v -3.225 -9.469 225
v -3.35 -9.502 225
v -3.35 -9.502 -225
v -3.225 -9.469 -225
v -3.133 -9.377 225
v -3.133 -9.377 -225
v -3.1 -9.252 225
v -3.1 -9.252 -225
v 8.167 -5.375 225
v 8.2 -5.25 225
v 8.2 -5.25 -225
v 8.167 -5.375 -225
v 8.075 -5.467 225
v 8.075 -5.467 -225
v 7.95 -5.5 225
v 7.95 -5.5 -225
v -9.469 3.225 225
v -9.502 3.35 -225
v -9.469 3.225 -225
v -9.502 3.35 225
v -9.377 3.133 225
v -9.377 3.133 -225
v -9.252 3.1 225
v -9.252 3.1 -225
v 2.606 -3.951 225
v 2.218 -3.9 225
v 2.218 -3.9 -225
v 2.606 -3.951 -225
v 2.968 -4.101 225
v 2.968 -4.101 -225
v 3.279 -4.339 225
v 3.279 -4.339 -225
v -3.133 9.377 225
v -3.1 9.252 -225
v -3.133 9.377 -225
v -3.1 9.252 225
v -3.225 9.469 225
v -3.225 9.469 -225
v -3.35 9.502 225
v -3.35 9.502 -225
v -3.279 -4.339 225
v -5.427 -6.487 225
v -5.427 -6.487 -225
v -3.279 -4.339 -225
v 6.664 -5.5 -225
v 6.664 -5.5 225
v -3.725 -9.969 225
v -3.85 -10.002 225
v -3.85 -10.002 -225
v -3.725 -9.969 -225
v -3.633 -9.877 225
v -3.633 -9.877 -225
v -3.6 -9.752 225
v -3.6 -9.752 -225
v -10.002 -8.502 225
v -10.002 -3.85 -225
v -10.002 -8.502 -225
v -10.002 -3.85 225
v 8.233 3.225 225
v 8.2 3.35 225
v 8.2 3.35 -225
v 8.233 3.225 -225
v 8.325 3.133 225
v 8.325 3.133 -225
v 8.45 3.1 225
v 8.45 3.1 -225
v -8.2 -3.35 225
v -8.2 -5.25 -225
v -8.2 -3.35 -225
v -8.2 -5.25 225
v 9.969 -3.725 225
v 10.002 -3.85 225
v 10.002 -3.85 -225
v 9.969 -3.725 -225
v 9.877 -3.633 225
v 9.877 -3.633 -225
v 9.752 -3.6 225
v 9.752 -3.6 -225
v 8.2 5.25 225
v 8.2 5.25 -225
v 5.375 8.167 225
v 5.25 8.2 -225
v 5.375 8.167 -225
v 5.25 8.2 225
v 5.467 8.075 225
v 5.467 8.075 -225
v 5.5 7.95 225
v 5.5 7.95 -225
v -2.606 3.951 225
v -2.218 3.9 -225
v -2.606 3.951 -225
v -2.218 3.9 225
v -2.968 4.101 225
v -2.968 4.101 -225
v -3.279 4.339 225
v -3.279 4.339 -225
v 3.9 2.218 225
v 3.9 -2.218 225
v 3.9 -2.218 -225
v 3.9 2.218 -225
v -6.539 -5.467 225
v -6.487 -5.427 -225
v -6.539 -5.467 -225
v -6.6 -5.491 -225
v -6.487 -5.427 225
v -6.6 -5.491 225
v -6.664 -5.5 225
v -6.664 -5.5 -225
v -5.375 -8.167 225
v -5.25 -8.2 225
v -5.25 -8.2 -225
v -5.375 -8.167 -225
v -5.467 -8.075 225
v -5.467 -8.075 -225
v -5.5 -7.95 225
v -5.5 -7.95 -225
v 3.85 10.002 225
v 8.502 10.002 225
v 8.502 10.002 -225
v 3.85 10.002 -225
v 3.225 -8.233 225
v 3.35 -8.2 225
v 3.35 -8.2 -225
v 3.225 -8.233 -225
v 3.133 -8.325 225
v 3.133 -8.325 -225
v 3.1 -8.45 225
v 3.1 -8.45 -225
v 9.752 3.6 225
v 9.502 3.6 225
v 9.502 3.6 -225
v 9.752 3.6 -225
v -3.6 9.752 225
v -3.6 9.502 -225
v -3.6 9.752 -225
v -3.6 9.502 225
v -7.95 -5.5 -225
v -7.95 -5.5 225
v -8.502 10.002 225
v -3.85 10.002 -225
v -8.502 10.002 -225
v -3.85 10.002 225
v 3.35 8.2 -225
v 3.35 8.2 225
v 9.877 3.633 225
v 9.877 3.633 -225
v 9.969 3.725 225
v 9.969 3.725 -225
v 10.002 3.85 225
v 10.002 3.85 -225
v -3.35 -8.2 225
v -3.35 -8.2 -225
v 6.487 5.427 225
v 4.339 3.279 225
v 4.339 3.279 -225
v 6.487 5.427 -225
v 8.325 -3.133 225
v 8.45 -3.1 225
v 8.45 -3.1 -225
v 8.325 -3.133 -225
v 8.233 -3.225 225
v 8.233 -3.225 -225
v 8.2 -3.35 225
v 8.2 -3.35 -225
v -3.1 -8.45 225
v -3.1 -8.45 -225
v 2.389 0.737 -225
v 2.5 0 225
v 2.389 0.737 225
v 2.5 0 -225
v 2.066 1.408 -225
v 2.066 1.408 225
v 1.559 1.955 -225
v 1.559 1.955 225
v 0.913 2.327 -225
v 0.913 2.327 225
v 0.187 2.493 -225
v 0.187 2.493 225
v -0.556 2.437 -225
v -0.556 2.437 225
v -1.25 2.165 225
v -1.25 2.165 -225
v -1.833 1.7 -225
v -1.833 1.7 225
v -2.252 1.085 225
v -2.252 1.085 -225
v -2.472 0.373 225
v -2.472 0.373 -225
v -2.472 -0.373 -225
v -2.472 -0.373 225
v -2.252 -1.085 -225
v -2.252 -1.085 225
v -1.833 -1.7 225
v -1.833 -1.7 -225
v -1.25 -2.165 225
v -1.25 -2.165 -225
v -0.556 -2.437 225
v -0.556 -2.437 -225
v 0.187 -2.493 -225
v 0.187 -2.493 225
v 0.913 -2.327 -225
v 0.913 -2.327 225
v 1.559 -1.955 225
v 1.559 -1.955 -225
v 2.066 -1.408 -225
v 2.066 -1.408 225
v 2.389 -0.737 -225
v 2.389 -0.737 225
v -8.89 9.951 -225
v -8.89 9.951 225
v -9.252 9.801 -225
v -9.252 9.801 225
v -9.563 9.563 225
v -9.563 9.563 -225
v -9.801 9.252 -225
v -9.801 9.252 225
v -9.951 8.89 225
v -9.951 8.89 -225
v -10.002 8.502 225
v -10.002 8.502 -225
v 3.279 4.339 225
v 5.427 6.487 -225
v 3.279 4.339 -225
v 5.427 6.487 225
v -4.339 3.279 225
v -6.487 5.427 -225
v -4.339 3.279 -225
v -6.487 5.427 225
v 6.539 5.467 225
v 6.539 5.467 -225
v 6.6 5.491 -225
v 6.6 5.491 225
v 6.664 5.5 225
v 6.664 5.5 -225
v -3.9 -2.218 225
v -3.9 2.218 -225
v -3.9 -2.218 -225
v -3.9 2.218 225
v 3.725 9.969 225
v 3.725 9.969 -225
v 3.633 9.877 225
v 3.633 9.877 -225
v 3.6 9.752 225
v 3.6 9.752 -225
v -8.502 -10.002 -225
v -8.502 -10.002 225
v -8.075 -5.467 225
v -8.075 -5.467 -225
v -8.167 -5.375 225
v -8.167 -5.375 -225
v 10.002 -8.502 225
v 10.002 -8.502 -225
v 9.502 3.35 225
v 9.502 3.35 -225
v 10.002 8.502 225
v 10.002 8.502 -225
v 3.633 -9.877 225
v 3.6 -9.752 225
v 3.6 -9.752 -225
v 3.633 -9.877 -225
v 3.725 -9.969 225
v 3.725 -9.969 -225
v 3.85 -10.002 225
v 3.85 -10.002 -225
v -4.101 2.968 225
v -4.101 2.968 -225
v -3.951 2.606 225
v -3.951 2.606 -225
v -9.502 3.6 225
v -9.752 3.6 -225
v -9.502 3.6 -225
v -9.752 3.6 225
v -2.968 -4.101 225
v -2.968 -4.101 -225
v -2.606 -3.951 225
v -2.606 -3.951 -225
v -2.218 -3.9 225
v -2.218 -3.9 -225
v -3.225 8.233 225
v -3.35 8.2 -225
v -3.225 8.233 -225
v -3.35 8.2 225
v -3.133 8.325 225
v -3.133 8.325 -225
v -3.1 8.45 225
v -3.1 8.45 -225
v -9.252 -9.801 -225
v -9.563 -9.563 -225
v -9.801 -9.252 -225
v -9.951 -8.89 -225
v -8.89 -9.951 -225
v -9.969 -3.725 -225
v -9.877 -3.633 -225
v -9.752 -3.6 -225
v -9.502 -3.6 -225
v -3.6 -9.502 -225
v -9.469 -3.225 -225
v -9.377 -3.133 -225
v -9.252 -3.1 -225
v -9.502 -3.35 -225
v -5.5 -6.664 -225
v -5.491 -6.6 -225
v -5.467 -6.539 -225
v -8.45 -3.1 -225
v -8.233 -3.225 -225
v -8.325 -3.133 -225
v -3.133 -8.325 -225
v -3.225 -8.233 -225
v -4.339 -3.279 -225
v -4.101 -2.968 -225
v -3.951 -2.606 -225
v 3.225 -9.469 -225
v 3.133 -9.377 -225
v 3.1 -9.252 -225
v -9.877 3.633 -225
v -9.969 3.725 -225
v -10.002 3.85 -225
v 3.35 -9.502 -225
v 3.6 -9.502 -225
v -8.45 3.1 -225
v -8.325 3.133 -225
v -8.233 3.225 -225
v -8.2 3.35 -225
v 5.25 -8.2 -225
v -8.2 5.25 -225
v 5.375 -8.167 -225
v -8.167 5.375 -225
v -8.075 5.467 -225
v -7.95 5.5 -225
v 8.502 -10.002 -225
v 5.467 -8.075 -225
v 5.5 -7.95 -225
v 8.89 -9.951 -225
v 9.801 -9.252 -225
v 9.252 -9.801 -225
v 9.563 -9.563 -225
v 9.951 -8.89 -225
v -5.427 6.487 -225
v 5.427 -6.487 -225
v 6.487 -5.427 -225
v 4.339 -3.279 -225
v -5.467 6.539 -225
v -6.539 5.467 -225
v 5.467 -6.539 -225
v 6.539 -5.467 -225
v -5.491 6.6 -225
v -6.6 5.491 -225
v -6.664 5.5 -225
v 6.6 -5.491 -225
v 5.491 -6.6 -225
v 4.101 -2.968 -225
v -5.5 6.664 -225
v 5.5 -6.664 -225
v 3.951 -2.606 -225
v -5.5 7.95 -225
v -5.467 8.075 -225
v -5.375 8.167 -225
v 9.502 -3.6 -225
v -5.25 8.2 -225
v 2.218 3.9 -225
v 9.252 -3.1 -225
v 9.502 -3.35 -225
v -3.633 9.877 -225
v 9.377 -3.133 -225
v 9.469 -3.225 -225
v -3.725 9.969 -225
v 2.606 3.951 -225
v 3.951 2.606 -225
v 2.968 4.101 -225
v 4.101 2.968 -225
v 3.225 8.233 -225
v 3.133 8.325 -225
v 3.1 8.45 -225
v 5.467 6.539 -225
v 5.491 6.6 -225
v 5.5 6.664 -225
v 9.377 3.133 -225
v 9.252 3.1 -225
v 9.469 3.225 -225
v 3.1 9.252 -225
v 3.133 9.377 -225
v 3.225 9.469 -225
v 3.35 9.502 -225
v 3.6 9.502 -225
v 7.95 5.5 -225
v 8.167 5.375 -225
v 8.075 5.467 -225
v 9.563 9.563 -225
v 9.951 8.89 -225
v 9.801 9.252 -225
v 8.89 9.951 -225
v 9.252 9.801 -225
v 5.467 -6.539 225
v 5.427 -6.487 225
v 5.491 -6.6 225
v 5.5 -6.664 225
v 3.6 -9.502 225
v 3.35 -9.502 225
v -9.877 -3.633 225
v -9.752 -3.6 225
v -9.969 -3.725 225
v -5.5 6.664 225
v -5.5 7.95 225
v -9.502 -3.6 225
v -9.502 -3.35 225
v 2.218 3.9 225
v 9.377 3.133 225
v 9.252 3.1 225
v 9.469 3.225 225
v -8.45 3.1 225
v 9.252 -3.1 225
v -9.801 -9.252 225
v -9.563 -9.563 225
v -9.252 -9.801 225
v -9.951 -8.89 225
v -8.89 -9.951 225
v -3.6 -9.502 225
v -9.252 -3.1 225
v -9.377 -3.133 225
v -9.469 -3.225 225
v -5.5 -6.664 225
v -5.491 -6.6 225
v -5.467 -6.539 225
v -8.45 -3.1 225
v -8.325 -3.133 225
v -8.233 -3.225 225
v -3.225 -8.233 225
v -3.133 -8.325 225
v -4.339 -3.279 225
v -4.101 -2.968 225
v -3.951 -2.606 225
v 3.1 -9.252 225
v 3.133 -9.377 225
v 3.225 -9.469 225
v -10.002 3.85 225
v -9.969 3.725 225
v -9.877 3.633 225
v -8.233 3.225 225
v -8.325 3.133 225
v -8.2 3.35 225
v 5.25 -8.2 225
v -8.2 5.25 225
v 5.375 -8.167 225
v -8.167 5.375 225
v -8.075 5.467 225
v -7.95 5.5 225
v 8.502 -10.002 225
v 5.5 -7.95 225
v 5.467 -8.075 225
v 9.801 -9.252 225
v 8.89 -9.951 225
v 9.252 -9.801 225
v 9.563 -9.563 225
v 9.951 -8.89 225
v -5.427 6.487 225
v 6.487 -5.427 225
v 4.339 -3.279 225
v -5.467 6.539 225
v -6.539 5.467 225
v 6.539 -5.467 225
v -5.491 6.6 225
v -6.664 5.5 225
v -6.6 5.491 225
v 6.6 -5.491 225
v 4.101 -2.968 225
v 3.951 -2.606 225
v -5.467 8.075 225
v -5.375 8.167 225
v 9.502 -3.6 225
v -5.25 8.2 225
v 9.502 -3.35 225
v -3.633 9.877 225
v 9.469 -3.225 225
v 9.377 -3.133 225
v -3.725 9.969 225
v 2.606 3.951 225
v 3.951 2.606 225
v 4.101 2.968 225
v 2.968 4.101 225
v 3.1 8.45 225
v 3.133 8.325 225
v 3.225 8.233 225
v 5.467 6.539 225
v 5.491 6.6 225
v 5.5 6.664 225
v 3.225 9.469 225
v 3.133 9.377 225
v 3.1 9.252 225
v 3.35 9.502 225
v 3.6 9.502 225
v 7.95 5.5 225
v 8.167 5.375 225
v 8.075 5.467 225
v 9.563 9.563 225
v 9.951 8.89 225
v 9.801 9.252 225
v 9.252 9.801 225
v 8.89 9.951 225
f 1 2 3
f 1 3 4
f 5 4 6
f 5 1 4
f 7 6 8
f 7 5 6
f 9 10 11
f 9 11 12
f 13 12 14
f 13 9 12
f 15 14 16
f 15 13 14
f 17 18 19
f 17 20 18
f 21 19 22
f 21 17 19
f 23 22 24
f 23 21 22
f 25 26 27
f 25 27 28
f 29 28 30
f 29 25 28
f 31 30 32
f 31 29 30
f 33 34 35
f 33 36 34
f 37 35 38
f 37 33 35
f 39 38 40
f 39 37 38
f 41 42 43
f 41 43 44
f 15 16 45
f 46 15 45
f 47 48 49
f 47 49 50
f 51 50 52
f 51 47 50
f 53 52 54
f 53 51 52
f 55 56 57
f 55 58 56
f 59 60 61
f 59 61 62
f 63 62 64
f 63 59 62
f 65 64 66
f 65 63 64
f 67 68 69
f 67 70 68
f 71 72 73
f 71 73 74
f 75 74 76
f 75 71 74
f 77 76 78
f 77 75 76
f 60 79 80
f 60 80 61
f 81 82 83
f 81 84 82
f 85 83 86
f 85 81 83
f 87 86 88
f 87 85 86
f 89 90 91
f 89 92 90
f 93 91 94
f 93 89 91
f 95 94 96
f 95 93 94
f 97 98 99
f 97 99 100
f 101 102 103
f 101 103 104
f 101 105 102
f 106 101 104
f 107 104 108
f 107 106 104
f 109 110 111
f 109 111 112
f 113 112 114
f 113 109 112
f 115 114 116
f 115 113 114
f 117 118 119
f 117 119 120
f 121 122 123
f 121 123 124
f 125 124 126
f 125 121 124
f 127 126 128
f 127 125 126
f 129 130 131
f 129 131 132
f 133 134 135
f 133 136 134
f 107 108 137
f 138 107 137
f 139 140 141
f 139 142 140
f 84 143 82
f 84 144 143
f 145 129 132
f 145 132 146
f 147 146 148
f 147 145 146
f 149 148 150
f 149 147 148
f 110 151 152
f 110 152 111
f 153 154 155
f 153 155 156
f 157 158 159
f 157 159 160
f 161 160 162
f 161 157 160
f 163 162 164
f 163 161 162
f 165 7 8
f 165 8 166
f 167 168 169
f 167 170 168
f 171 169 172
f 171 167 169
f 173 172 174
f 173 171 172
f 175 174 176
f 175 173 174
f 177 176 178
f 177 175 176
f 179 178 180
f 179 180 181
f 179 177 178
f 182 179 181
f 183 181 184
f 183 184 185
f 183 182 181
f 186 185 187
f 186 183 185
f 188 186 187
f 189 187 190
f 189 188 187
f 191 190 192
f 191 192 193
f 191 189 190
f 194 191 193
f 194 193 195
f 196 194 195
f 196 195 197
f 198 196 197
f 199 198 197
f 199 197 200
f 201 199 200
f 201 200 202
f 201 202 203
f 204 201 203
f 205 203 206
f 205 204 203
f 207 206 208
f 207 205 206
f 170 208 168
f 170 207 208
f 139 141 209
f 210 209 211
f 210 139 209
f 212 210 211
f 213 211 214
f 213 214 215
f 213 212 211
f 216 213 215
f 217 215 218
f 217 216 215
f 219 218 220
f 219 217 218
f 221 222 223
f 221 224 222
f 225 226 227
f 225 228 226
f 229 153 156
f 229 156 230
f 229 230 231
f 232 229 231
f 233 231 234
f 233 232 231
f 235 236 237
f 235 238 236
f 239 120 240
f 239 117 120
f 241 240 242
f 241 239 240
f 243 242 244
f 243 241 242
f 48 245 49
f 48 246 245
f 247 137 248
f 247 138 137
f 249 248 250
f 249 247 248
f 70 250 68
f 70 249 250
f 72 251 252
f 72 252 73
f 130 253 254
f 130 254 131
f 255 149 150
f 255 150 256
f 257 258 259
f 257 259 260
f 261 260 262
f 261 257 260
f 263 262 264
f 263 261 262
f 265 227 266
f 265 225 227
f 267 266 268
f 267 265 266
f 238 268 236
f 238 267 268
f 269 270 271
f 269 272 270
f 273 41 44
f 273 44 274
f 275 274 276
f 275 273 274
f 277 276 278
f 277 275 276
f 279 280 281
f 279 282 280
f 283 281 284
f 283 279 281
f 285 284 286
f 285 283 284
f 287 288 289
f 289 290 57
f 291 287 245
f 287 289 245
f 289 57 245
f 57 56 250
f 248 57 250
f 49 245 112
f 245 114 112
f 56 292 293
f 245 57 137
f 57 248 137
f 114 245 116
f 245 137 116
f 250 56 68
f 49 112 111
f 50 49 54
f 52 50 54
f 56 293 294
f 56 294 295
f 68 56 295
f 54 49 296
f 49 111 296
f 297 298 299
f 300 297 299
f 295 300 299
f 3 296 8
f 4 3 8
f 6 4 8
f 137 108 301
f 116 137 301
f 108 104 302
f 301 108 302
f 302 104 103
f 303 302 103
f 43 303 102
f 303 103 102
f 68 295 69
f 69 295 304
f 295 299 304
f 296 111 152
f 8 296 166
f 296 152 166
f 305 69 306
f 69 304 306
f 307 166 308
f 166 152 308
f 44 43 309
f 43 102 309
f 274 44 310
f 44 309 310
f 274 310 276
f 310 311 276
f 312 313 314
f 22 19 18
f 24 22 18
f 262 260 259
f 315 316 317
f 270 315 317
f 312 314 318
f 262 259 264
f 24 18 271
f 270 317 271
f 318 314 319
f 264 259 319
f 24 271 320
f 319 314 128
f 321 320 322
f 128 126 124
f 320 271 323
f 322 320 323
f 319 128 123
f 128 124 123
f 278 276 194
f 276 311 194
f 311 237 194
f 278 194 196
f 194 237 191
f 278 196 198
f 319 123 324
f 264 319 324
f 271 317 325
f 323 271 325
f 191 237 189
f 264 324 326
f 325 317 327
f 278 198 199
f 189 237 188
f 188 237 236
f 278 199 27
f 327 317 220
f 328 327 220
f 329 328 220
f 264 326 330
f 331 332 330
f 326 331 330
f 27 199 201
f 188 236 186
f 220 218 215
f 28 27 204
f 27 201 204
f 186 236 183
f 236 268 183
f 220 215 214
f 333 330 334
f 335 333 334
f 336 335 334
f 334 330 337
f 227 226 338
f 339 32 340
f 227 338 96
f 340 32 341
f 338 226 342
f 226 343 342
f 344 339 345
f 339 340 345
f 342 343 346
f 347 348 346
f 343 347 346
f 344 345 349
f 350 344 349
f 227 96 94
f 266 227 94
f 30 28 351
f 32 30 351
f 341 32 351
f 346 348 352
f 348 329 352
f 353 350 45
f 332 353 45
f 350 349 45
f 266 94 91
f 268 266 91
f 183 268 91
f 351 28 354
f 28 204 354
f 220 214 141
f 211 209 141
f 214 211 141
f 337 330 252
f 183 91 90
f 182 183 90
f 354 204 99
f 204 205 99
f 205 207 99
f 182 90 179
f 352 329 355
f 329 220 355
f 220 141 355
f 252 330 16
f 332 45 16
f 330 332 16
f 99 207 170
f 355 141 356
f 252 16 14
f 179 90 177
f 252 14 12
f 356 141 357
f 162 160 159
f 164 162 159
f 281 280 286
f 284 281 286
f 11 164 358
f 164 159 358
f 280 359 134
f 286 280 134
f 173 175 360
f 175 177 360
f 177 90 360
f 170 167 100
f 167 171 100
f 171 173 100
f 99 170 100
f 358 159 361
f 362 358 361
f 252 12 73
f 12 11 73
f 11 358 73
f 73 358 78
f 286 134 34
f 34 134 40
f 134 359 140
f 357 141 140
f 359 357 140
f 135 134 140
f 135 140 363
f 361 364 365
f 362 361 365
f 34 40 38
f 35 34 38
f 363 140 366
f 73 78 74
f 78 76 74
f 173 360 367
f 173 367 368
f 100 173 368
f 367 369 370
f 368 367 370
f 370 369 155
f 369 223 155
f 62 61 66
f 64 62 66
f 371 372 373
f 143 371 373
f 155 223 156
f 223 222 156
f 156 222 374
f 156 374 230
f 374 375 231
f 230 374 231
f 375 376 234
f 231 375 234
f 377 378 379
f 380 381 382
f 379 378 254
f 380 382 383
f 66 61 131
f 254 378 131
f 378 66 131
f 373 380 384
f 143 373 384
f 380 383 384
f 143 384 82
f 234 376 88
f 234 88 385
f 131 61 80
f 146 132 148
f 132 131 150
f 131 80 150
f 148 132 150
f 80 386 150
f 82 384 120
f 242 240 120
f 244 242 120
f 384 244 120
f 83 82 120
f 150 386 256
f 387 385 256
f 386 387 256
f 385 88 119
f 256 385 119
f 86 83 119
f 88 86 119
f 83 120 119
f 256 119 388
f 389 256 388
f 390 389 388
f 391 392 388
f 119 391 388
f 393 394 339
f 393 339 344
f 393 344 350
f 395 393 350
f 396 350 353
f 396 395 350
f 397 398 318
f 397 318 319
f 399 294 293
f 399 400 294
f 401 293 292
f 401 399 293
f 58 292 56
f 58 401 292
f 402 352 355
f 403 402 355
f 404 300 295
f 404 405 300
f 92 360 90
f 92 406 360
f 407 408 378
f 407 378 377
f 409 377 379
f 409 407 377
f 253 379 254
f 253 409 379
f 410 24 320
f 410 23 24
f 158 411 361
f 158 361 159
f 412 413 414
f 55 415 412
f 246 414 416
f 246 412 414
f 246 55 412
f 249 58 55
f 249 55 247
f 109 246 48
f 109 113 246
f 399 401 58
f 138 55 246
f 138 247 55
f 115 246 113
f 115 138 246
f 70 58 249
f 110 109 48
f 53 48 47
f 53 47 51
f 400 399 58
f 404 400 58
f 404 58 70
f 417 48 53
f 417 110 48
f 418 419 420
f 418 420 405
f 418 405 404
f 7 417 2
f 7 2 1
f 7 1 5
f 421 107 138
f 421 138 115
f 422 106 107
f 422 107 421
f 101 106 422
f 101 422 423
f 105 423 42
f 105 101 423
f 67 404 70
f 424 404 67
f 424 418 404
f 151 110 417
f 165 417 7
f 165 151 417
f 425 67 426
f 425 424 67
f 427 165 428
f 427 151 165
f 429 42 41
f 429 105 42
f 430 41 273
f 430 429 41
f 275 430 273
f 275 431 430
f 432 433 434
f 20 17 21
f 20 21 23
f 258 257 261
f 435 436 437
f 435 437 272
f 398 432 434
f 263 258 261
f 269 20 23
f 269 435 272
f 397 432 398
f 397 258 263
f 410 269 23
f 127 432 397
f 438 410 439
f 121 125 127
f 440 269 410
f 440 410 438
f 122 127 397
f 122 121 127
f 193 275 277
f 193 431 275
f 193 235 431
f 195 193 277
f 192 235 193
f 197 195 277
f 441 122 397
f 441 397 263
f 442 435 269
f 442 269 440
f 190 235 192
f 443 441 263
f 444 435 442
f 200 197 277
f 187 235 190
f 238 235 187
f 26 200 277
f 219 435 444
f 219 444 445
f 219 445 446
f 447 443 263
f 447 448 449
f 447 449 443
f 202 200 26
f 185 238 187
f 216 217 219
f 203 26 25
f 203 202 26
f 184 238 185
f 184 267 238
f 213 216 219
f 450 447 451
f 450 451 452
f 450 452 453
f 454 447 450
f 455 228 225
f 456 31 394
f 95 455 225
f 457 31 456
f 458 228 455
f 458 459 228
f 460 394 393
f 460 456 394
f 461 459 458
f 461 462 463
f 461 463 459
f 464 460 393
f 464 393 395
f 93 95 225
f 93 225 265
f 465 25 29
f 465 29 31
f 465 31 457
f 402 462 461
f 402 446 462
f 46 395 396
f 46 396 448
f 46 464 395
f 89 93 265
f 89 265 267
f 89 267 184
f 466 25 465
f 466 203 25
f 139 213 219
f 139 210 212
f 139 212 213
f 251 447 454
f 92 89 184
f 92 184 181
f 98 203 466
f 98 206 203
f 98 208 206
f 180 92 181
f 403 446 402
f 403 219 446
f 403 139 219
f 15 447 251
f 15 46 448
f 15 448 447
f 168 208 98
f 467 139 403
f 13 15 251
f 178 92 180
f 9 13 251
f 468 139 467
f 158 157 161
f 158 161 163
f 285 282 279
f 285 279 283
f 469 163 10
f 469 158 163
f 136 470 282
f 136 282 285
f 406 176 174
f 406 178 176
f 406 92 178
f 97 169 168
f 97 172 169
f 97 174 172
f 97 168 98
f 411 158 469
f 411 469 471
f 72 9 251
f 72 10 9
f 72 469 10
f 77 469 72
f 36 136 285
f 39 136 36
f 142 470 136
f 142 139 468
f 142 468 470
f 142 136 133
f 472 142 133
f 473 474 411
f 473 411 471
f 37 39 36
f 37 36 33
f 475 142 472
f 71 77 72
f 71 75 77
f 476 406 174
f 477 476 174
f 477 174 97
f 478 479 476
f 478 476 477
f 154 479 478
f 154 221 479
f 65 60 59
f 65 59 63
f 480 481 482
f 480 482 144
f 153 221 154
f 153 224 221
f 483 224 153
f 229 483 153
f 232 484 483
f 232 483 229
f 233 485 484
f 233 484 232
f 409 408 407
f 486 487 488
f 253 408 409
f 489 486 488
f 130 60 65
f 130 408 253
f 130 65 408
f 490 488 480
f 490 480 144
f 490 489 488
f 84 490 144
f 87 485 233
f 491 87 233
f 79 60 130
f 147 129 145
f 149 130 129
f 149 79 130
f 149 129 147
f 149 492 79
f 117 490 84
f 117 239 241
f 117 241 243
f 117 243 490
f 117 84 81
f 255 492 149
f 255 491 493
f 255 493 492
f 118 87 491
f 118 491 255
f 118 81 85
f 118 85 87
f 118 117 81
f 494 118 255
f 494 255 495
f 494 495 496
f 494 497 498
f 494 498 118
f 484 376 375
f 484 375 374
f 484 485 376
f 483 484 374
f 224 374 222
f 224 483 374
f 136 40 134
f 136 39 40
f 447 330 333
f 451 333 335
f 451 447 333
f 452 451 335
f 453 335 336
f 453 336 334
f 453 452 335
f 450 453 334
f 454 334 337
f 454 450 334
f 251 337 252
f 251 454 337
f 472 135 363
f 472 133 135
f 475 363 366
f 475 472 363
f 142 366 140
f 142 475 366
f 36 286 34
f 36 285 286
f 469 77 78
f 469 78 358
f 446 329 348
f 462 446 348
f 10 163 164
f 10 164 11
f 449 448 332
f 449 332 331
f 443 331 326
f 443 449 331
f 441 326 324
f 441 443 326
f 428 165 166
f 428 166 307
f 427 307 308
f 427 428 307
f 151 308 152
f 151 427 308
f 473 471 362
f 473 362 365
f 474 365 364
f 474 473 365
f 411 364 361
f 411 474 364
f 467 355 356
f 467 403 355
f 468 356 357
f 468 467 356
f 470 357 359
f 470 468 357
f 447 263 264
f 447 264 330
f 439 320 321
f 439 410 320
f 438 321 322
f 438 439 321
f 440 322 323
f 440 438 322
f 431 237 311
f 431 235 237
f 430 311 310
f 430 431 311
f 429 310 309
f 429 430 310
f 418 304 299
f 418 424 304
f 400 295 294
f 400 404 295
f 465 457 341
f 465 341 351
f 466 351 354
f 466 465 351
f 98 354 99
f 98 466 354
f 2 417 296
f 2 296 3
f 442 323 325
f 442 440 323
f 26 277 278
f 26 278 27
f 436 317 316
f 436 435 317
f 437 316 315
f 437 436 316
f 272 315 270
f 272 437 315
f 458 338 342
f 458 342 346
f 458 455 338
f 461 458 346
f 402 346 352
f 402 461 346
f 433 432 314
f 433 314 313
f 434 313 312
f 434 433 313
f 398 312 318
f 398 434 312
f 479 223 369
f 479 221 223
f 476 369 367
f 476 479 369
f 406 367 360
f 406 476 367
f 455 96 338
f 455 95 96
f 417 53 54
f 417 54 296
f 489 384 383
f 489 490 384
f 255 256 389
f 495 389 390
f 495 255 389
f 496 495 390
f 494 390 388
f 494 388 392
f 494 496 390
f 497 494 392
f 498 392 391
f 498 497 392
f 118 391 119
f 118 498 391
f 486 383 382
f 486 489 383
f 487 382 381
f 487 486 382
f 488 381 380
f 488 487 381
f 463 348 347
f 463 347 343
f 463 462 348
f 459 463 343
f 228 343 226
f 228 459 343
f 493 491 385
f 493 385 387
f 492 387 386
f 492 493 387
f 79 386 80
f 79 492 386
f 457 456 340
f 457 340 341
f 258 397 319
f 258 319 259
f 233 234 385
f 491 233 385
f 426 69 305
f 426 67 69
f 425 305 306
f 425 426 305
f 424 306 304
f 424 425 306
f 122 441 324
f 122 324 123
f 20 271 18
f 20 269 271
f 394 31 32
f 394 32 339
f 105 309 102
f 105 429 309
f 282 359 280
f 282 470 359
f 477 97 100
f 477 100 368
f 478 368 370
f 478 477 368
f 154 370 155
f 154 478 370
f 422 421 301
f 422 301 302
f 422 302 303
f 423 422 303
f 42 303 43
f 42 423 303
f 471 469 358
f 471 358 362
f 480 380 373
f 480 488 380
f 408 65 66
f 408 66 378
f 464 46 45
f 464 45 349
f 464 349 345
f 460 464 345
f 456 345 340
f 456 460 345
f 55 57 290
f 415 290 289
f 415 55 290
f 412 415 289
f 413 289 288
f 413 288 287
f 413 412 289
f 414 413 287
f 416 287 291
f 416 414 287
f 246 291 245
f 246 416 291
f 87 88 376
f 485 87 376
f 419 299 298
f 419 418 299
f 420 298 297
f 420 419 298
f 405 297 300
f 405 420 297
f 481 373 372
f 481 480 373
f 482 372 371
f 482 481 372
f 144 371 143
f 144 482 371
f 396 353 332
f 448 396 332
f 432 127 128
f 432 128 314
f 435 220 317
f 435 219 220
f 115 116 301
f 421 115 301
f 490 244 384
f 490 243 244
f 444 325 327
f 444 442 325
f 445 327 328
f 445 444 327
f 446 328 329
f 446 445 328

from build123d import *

# Parameters (mm, degrees)
SKETCH_1_R      = 2.5
EXTRUDE_1_DEPTH = 225


with BuildPart() as part:
    # 草图1 → 凸台-拉伸1 (new, symmetric)
    with BuildSketch(Plane.XY):
        with BuildLine():
            Line((-8.502261885, -10.002261885), (-3.85, -10.002261885))
            ThreePointArc((-3.85, -10.002261885), (-3.673223305, -9.929038581), (-3.6, -9.752261885))
            Line((-3.6, -9.752261885), (-3.6, -9.502261885))
            Line((-3.6, -9.502261885), (-3.35, -9.502261885))
            ThreePointArc((-3.35, -9.502261885), (-3.173223305, -9.429038581), (-3.1, -9.252261885))
            Line((-3.1, -9.252261885), (-3.1, -8.45))
            ThreePointArc((-3.1, -8.45), (-3.173223305, -8.273223305), (-3.35, -8.2))
            Line((-3.35, -8.2), (-5.25, -8.2))
            ThreePointArc((-5.25, -8.2), (-5.426776695, -8.126776695), (-5.5, -7.95))
            Line((-5.5, -7.95), (-5.5, -6.664213562))
            ThreePointArc((-5.5, -6.664213562), (-5.480969883, -6.568542704), (-5.426776695, -6.487436867))
            Line((-5.426776695, -6.487436867), (-3.278679656, -4.339339828))
            ThreePointArc((-3.278679656, -4.339339828), (-2.792044633, -4.014180701), (-2.218019485, -3.9))
            Line((-2.218019485, -3.9), (2.218019485, -3.9))
            ThreePointArc((2.218019485, -3.9), (2.792044633, -4.014180701), (3.278679656, -4.339339828))
            Line((3.278679656, -4.339339828), (5.426776695, -6.487436867))
            ThreePointArc((5.426776695, -6.487436867), (5.480969883, -6.568542704), (5.5, -6.664213562))
            Line((5.5, -6.664213562), (5.5, -7.95))
            ThreePointArc((5.5, -7.95), (5.426776695, -8.126776695), (5.25, -8.2))
            Line((5.25, -8.2), (3.35, -8.2))
            ThreePointArc((3.35, -8.2), (3.173223305, -8.273223305), (3.1, -8.45))
            Line((3.1, -8.45), (3.1, -9.252261885))
            ThreePointArc((3.1, -9.252261885), (3.173223305, -9.429038581), (3.35, -9.502261885))
            Line((3.35, -9.502261885), (3.6, -9.502261885))
            Line((3.6, -9.502261885), (3.6, -9.752261885))
            ThreePointArc((3.6, -9.752261885), (3.673223305, -9.929038581), (3.85, -10.002261885))
            Line((3.85, -10.002261885), (8.502261885, -10.002261885))
            ThreePointArc((8.502261885, -10.002261885), (9.562922057, -9.562922057), (10.002261885, -8.502261885))
            Line((10.002261885, -8.502261885), (10.002261885, -3.85))
            ThreePointArc((10.002261885, -3.85), (9.929038581, -3.673223305), (9.752261885, -3.6))
            Line((9.752261885, -3.6), (9.502261885, -3.6))
            Line((9.502261885, -3.6), (9.502261885, -3.35))
            ThreePointArc((9.502261885, -3.35), (9.429038581, -3.173223305), (9.252261885, -3.1))
            Line((9.252261885, -3.1), (8.45, -3.1))
            ThreePointArc((8.45, -3.1), (8.273223305, -3.173223305), (8.2, -3.35))
            Line((8.2, -3.35), (8.2, -5.25))
            ThreePointArc((8.2, -5.25), (8.126776695, -5.426776695), (7.95, -5.5))
            Line((7.95, -5.5), (6.664213562, -5.5))
            ThreePointArc((6.664213562, -5.5), (6.568542704, -5.480969883), (6.487436867, -5.426776695))
            Line((6.487436867, -5.426776695), (4.339339828, -3.278679656))
            ThreePointArc((4.339339828, -3.278679656), (4.014180701, -2.792044633), (3.9, -2.218019485))
            Line((3.9, -2.218019485), (3.9, 2.218019485))
            ThreePointArc((3.9, 2.218019485), (4.014180701, 2.792044633), (4.339339828, 3.278679656))
            Line((4.339339828, 3.278679656), (6.487436867, 5.426776695))
            ThreePointArc((6.487436867, 5.426776695), (6.568542704, 5.480969883), (6.664213562, 5.5))
            Line((6.664213562, 5.5), (7.95, 5.5))
            ThreePointArc((7.95, 5.5), (8.126776695, 5.426776695), (8.2, 5.25))
            Line((8.2, 5.25), (8.2, 3.35))
            ThreePointArc((8.2, 3.35), (8.273223305, 3.173223305), (8.45, 3.1))
            Line((8.45, 3.1), (9.252261885, 3.1))
            ThreePointArc((9.252261885, 3.1), (9.429038581, 3.173223305), (9.502261885, 3.35))
            Line((9.502261885, 3.35), (9.502261885, 3.6))
            Line((9.502261885, 3.6), (9.752261885, 3.6))
            ThreePointArc((9.752261885, 3.6), (9.929038581, 3.673223305), (10.002261885, 3.85))
            Line((10.002261885, 3.85), (10.002261885, 8.502261885))
            ThreePointArc((10.002261885, 8.502261885), (9.562922057, 9.562922057), (8.502261885, 10.002261885))
            Line((8.502261885, 10.002261885), (3.85, 10.002261885))
            ThreePointArc((3.85, 10.002261885), (3.673223305, 9.929038581), (3.6, 9.752261885))
            Line((3.6, 9.752261885), (3.6, 9.502261885))
            Line((3.6, 9.502261885), (3.35, 9.502261885))
            ThreePointArc((3.35, 9.502261885), (3.173223305, 9.429038581), (3.1, 9.252261885))
            Line((3.1, 9.252261885), (3.1, 8.45))
            ThreePointArc((3.1, 8.45), (3.173223305, 8.273223305), (3.35, 8.2))
            Line((3.35, 8.2), (5.25, 8.2))
            ThreePointArc((5.25, 8.2), (5.426776695, 8.126776695), (5.5, 7.95))
            Line((5.5, 7.95), (5.5, 6.664213562))
            ThreePointArc((5.5, 6.664213562), (5.480969883, 6.568542704), (5.426776695, 6.487436867))
            Line((5.426776695, 6.487436867), (3.278679656, 4.339339828))
            ThreePointArc((3.278679656, 4.339339828), (2.792044633, 4.014180701), (2.218019485, 3.9))
            Line((2.218019485, 3.9), (-2.218019485, 3.9))
            ThreePointArc((-2.218019485, 3.9), (-2.792044633, 4.014180701), (-3.278679656, 4.339339828))
            Line((-3.278679656, 4.339339828), (-5.426776695, 6.487436867))
            ThreePointArc((-5.426776695, 6.487436867), (-5.480969883, 6.568542704), (-5.5, 6.664213562))
            Line((-5.5, 6.664213562), (-5.5, 7.95))
            ThreePointArc((-5.5, 7.95), (-5.426776695, 8.126776695), (-5.25, 8.2))
            Line((-5.25, 8.2), (-3.35, 8.2))
            ThreePointArc((-3.35, 8.2), (-3.173223305, 8.273223305), (-3.1, 8.45))
            Line((-3.1, 8.45), (-3.1, 9.252261885))
            ThreePointArc((-3.1, 9.252261885), (-3.173223305, 9.429038581), (-3.35, 9.502261885))
            Line((-3.35, 9.502261885), (-3.6, 9.502261885))
            Line((-3.6, 9.502261885), (-3.6, 9.752261885))
            ThreePointArc((-3.6, 9.752261885), (-3.673223305, 9.929038581), (-3.85, 10.002261885))
            Line((-3.85, 10.002261885), (-8.502261885, 10.002261885))
            ThreePointArc((-8.502261885, 10.002261885), (-9.562922057, 9.562922057), (-10.002261885, 8.502261885))
            Line((-10.002261885, 8.502261885), (-10.002261885, 3.85))
            ThreePointArc((-10.002261885, 3.85), (-9.929038581, 3.673223305), (-9.752261885, 3.6))
            Line((-9.752261885, 3.6), (-9.502261885, 3.6))
            Line((-9.502261885, 3.6), (-9.502261885, 3.35))
            ThreePointArc((-9.502261885, 3.35), (-9.429038581, 3.173223305), (-9.252261885, 3.1))
            Line((-9.252261885, 3.1), (-8.45, 3.1))
            ThreePointArc((-8.45, 3.1), (-8.273223305, 3.173223305), (-8.2, 3.35))
            Line((-8.2, 3.35), (-8.2, 5.25))
            ThreePointArc((-8.2, 5.25), (-8.126776695, 5.426776695), (-7.95, 5.5))
            Line((-7.95, 5.5), (-6.664213562, 5.5))
            ThreePointArc((-6.664213562, 5.5), (-6.568542704, 5.480969883), (-6.487436867, 5.426776695))
            Line((-6.487436867, 5.426776695), (-4.339339828, 3.278679656))
            ThreePointArc((-4.339339828, 3.278679656), (-4.014180701, 2.792044633), (-3.9, 2.218019485))
            Line((-3.9, 2.218019485), (-3.9, -2.218019485))
            ThreePointArc((-3.9, -2.218019485), (-4.014180701, -2.792044633), (-4.339339828, -3.278679656))
            Line((-4.339339828, -3.278679656), (-6.487436867, -5.426776695))
            ThreePointArc((-6.487436867, -5.426776695), (-6.568542704, -5.480969883), (-6.664213562, -5.5))
            Line((-6.664213562, -5.5), (-7.95, -5.5))
            ThreePointArc((-7.95, -5.5), (-8.126776695, -5.426776695), (-8.2, -5.25))
            Line((-8.2, -5.25), (-8.2, -3.35))
            ThreePointArc((-8.2, -3.35), (-8.273223305, -3.173223305), (-8.45, -3.1))
            Line((-8.45, -3.1), (-9.252261885, -3.1))
            ThreePointArc((-9.252261885, -3.1), (-9.429038581, -3.173223305), (-9.502261885, -3.35))
            Line((-9.502261885, -3.35), (-9.502261885, -3.6))
            Line((-9.502261885, -3.6), (-9.752261885, -3.6))
            ThreePointArc((-9.752261885, -3.6), (-9.929038581, -3.673223305), (-10.002261885, -3.85))
            Line((-10.002261885, -3.85), (-10.002261885, -8.502261885))
            ThreePointArc((-10.002261885, -8.502261885), (-9.562922057, -9.562922057), (-8.502261885, -10.002261885))
        make_face()
        Circle(SKETCH_1_R, mode=Mode.SUBTRACT)
    extrude(amount=EXTRUDE_1_DEPTH, both=True)


solid = part.part
